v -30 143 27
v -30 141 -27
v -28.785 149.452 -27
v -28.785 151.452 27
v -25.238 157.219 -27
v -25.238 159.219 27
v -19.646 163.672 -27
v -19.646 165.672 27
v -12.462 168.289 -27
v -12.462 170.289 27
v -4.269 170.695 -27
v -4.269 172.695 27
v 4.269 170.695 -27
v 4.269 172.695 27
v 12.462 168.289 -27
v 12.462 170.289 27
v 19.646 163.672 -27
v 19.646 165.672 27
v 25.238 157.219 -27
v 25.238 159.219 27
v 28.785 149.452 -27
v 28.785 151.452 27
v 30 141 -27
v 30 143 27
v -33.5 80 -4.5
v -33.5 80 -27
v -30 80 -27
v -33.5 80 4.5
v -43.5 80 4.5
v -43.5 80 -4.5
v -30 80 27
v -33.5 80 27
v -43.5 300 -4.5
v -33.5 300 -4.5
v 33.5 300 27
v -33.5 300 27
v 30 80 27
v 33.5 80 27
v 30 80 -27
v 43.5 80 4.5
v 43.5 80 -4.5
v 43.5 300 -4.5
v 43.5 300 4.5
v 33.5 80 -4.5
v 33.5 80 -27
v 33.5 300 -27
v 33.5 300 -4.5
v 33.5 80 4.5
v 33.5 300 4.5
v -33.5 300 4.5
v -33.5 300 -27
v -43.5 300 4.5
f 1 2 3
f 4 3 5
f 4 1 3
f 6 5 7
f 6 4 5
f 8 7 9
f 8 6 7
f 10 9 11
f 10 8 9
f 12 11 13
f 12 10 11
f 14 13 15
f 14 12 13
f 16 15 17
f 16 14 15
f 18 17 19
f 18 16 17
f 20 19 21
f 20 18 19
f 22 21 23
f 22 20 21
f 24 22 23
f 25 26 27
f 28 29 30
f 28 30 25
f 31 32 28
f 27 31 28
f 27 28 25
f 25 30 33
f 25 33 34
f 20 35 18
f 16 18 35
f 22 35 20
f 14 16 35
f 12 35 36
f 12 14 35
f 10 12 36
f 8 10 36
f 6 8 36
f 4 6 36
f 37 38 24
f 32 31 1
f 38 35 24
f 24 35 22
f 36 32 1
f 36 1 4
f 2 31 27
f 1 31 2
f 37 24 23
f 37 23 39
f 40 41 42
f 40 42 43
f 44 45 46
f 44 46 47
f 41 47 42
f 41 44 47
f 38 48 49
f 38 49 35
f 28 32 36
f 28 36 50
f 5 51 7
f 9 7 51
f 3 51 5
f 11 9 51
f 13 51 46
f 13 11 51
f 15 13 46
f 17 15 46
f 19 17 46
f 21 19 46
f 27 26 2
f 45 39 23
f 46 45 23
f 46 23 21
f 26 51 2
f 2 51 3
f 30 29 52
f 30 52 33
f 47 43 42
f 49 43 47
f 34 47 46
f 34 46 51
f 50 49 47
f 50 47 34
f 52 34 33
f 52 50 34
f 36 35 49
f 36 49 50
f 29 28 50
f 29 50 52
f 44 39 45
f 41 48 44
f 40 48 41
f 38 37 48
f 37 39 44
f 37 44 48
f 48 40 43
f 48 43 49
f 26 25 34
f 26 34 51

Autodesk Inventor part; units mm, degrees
ref_plane "YZ Plane" through (0, 0, 0) normal (1, 0, 0) x (0, 1, 0)
ref_plane "XZ Plane" through (0, 0, 0) normal (0, 1, 0) x (-1, 0, 0)
ref_plane "XY Plane" through (0, 0, 0) normal (0, 0, 1) x (1, 0, 0)
sketch "草圖1" plane through (0, 0, 0) normal (0, 1, 0) x (-1, 0, 0)
  line L0 (-33.5, 27) -> (33.5, 27)
  line L1 (33.5, 27) -> (33.5, -27)
  line L2 (33.5, -27) -> (-33.5, -27)
  line L3 (-33.5, -27) -> (-33.5, 27)
  line L4 (-33.5, 27) -> (33.5, -27) construction
  line L5 (33.5, 27) -> (-33.5, -27) construction
  line L6 (43.5, -4.5) -> (33.5, -4.5)
  line L7 (33.5, -4.5) -> (33.5, 4.5)
  line L8 (33.5, 4.5) -> (43.5, 4.5)
  line L9 (43.5, 4.5) -> (43.5, -4.5)
  line L10 (-33.5, -4.5) -> (-43.5, -4.5)
  line L11 (-43.5, -4.5) -> (-43.5, 4.5)
  line L12 (-43.5, 4.5) -> (-33.5, 4.5)
  line L13 (-33.5, 4.5) -> (-33.5, -4.5)
  point P0 (0, 0)
  point P1 (33.5, 0)
  point P2 (-33.5, 0)
  point P3 (-33.5, 4.5)
  point P4 (-33.5, -4.5)
  dimension "d0" = 67
  dimension "d1" = 54
  dimension "d2" = 9
  dimension "d3" = 10
extrude "擠出1" add sketch "草圖1" along normal blind 300
sketch "草圖2" plane through (-33.5, 0, 27) normal (0, 0, 1) x (1, 0, 0)
  circle A0 centre (33.5, 125) radius 30
  line L0 (0, 0) -> (67, 0) projected
  line L1 (3.5, 125) -> (63.5, 125)
  line L2 (63.5, 125) -> (63.5, -22.0707)
  line L3 (63.5, -22.0707) -> (3.5, -22.0707)
  line L4 (3.5, -22.0707) -> (3.5, 125)
  point P0 (33.5, 0)
  point P1 (33.5, 0)
  point P2 (63.5, 125)
  dimension "d6" = 125
  dimension "d7" = 60
extrude "擠出2" cut sketch "草圖2" against normal through all
sketch "草圖3" plane through (-33.5, 300, 27) normal (0, 0, 1) x (1, 0, 0)
  line L0 (-40.579, -220) -> (107.579, -220)
  line L1 (107.579, -220) -> (107.579, -300)
  line L2 (107.579, -300) -> (-40.579, -300)
  line L3 (-40.579, -300) -> (-40.579, -220)
  point P0 (33.5, -300)
  point P1 (33.5, -300)
  dimension "d10" = 80
extrude "擠出3" cut sketch "草圖3" against normal through all
sketch "草圖4" plane through (33.5, 300, -27) normal (0, 0, -1) x (-1, 0, 0)
  arc A0 (63.5, -175) -> (3.5, -175) centre (33.5, -175) ccw construction
  circle A1 centre (33.5, -159) radius 30
  line L0 (63.5, -220) -> (3.5, -220)
  line L1 (3.5, -220) -> (3.5, -159)
  line L2 (3.5, -159) -> (63.5, -159)
  line L3 (63.5, -159) -> (63.5, -220)
  point P0 (33.5, -300)
  point P1 (63.5, -220)
  dimension "d13" = 16
  dimension "d14" = 60
sketch "草圖5" plane through (-33.5, 300, 27) normal (0, 0, 1) x (1, 0, 0)
  arc A0 (63.5, -175) -> (3.5, -175) centre (33.5, -175) ccw construction
  circle A1 centre (33.5, -157) radius 30
  line L0 (63.5, -220) -> (3.5, -220)
  line L1 (3.5, -220) -> (3.5, -157)
  line L2 (3.5, -157) -> (63.5, -157)
  line L3 (63.5, -157) -> (63.5, -220)
  point P0 (33.5, -300)
  dimension "d15" = 18
  dimension "d16" = 60
loft "斷面混成1" cut profiles "草圖4", "草圖5"
properties part number "Slider-5"
